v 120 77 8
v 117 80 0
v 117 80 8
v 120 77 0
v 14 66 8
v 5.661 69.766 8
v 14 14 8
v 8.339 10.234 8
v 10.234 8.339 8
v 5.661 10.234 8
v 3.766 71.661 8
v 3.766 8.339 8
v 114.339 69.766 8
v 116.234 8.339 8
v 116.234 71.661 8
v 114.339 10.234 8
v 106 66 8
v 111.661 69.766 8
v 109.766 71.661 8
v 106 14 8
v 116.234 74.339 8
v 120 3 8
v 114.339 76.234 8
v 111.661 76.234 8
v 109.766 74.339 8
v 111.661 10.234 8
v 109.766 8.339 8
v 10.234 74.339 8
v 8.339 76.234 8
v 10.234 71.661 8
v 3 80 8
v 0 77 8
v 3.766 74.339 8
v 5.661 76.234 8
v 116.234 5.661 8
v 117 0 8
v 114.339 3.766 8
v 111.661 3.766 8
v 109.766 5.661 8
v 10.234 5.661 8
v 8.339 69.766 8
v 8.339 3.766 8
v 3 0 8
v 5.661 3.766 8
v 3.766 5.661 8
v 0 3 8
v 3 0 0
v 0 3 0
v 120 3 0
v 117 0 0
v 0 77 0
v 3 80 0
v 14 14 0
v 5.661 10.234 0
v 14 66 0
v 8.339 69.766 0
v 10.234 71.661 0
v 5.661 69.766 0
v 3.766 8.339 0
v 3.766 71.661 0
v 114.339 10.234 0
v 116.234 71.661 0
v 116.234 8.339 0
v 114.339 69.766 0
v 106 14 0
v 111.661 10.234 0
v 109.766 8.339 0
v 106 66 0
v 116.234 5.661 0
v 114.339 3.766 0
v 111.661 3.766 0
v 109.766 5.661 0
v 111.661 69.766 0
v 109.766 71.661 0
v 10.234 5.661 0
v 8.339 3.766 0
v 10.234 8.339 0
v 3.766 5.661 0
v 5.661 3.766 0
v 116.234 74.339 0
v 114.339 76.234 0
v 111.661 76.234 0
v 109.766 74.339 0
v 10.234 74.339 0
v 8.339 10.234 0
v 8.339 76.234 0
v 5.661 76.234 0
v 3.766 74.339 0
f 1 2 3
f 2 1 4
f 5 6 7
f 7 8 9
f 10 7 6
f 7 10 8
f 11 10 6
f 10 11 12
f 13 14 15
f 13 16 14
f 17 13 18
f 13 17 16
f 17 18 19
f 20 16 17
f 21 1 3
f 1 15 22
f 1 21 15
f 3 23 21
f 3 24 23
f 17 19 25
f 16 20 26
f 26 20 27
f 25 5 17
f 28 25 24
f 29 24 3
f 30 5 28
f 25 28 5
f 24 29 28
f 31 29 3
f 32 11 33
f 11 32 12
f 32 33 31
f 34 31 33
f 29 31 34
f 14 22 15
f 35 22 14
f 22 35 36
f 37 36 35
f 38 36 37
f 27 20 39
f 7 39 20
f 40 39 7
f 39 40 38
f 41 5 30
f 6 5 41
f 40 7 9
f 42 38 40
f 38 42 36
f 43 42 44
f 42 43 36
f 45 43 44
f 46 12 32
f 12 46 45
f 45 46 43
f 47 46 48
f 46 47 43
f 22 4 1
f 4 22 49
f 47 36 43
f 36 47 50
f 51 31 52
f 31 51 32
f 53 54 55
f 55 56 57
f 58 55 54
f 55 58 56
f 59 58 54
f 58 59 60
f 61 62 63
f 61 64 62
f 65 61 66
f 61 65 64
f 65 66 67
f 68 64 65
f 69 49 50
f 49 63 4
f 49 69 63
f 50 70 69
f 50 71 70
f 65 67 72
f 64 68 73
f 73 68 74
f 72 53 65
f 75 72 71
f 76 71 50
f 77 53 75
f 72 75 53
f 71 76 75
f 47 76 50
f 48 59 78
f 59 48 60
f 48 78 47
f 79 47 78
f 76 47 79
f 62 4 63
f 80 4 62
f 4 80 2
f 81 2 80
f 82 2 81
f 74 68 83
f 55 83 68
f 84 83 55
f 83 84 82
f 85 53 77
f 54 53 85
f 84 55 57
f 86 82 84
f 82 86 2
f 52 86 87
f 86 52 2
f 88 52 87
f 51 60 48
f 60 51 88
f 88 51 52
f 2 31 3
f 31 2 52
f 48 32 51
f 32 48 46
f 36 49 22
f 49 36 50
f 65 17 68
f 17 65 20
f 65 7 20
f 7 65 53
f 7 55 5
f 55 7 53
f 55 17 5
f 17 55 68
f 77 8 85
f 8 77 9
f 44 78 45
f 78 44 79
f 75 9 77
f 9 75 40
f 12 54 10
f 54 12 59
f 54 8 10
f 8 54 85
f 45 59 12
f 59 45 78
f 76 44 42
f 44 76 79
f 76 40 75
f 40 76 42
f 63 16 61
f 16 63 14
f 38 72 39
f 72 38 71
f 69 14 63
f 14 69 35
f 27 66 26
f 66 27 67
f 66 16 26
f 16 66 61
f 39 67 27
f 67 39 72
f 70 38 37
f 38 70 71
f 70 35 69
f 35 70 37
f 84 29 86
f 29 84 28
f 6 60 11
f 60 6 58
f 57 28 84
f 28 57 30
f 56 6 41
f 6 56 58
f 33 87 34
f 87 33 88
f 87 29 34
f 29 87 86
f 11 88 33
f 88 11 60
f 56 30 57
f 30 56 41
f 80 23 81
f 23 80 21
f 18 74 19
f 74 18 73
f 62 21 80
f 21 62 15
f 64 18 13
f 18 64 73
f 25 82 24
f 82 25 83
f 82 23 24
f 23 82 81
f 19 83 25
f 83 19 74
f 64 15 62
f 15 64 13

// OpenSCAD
$fn = 32;

// ----------------------------------------------------------------------
// Frame plate: 120 x 80 frame, 14 mm rails
// ----------------------------------------------------------------------

// --- parameters (mm) ---
plate_l = 120;            // plate length, X
plate_w = 80;             // plate width, Y
plate_t = 8;              // plate thickness, Z (extrusion height)
corner_c = 3;             // corner chamfer
frame_bar = 14;           // frame rail width
bolt_r = 3.5;             // corner bolt window radius
bolt_inset = 7;           // bolt centre inset from the edges

win_l = plate_l - 2 * frame_bar;  // window length
win_w = plate_w - 2 * frame_bar;  // window width
bolt_d = 2 * bolt_r;  // corner hole diameter

profile = [[3, 0], [117, 0], [120, 3], [120, 77], [117, 80], [3, 80], [0, 77], [0, 3]];  // primary outline, 8 points, counter clockwise
void_1 = [[14, 14], [106, 14], [106, 66], [14, 66]];  // the window, 4 points
void_2 = [[10.234, 8.339], [8.339, 10.234], [5.661, 10.234], [3.766, 8.339], [3.766, 5.661], [5.661, 3.766], [8.339, 3.766], [10.234, 5.661]];  // corner bolt window, 8 points
void_3 = [[116.234, 8.339], [114.339, 10.234], [111.661, 10.234], [109.766, 8.339], [109.766, 5.661], [111.661, 3.766], [114.339, 3.766], [116.234, 5.661]];  // corner bolt window, 8 points
void_4 = [[10.234, 74.339], [8.339, 76.234], [5.661, 76.234], [3.766, 74.339], [3.766, 71.661], [5.661, 69.766], [8.339, 69.766], [10.234, 71.661]];  // corner bolt window, 8 points
void_5 = [[116.234, 74.339], [114.339, 76.234], [111.661, 76.234], [109.766, 74.339], [109.766, 71.661], [111.661, 69.766], [114.339, 69.766], [116.234, 71.661]];  // corner bolt window, 8 points

// --- the one profile operation ---
difference() {
  linear_extrude(height = plate_t) polygon(points = profile);
  translate([0, 0, -1])
    linear_extrude(height = plate_t + 2) polygon(points = void_1);
  translate([0, 0, -1])
    linear_extrude(height = plate_t + 2) polygon(points = void_2);
  translate([0, 0, -1])
    linear_extrude(height = plate_t + 2) polygon(points = void_3);
  translate([0, 0, -1])
    linear_extrude(height = plate_t + 2) polygon(points = void_4);
  translate([0, 0, -1])
    linear_extrude(height = plate_t + 2) polygon(points = void_5);
}
